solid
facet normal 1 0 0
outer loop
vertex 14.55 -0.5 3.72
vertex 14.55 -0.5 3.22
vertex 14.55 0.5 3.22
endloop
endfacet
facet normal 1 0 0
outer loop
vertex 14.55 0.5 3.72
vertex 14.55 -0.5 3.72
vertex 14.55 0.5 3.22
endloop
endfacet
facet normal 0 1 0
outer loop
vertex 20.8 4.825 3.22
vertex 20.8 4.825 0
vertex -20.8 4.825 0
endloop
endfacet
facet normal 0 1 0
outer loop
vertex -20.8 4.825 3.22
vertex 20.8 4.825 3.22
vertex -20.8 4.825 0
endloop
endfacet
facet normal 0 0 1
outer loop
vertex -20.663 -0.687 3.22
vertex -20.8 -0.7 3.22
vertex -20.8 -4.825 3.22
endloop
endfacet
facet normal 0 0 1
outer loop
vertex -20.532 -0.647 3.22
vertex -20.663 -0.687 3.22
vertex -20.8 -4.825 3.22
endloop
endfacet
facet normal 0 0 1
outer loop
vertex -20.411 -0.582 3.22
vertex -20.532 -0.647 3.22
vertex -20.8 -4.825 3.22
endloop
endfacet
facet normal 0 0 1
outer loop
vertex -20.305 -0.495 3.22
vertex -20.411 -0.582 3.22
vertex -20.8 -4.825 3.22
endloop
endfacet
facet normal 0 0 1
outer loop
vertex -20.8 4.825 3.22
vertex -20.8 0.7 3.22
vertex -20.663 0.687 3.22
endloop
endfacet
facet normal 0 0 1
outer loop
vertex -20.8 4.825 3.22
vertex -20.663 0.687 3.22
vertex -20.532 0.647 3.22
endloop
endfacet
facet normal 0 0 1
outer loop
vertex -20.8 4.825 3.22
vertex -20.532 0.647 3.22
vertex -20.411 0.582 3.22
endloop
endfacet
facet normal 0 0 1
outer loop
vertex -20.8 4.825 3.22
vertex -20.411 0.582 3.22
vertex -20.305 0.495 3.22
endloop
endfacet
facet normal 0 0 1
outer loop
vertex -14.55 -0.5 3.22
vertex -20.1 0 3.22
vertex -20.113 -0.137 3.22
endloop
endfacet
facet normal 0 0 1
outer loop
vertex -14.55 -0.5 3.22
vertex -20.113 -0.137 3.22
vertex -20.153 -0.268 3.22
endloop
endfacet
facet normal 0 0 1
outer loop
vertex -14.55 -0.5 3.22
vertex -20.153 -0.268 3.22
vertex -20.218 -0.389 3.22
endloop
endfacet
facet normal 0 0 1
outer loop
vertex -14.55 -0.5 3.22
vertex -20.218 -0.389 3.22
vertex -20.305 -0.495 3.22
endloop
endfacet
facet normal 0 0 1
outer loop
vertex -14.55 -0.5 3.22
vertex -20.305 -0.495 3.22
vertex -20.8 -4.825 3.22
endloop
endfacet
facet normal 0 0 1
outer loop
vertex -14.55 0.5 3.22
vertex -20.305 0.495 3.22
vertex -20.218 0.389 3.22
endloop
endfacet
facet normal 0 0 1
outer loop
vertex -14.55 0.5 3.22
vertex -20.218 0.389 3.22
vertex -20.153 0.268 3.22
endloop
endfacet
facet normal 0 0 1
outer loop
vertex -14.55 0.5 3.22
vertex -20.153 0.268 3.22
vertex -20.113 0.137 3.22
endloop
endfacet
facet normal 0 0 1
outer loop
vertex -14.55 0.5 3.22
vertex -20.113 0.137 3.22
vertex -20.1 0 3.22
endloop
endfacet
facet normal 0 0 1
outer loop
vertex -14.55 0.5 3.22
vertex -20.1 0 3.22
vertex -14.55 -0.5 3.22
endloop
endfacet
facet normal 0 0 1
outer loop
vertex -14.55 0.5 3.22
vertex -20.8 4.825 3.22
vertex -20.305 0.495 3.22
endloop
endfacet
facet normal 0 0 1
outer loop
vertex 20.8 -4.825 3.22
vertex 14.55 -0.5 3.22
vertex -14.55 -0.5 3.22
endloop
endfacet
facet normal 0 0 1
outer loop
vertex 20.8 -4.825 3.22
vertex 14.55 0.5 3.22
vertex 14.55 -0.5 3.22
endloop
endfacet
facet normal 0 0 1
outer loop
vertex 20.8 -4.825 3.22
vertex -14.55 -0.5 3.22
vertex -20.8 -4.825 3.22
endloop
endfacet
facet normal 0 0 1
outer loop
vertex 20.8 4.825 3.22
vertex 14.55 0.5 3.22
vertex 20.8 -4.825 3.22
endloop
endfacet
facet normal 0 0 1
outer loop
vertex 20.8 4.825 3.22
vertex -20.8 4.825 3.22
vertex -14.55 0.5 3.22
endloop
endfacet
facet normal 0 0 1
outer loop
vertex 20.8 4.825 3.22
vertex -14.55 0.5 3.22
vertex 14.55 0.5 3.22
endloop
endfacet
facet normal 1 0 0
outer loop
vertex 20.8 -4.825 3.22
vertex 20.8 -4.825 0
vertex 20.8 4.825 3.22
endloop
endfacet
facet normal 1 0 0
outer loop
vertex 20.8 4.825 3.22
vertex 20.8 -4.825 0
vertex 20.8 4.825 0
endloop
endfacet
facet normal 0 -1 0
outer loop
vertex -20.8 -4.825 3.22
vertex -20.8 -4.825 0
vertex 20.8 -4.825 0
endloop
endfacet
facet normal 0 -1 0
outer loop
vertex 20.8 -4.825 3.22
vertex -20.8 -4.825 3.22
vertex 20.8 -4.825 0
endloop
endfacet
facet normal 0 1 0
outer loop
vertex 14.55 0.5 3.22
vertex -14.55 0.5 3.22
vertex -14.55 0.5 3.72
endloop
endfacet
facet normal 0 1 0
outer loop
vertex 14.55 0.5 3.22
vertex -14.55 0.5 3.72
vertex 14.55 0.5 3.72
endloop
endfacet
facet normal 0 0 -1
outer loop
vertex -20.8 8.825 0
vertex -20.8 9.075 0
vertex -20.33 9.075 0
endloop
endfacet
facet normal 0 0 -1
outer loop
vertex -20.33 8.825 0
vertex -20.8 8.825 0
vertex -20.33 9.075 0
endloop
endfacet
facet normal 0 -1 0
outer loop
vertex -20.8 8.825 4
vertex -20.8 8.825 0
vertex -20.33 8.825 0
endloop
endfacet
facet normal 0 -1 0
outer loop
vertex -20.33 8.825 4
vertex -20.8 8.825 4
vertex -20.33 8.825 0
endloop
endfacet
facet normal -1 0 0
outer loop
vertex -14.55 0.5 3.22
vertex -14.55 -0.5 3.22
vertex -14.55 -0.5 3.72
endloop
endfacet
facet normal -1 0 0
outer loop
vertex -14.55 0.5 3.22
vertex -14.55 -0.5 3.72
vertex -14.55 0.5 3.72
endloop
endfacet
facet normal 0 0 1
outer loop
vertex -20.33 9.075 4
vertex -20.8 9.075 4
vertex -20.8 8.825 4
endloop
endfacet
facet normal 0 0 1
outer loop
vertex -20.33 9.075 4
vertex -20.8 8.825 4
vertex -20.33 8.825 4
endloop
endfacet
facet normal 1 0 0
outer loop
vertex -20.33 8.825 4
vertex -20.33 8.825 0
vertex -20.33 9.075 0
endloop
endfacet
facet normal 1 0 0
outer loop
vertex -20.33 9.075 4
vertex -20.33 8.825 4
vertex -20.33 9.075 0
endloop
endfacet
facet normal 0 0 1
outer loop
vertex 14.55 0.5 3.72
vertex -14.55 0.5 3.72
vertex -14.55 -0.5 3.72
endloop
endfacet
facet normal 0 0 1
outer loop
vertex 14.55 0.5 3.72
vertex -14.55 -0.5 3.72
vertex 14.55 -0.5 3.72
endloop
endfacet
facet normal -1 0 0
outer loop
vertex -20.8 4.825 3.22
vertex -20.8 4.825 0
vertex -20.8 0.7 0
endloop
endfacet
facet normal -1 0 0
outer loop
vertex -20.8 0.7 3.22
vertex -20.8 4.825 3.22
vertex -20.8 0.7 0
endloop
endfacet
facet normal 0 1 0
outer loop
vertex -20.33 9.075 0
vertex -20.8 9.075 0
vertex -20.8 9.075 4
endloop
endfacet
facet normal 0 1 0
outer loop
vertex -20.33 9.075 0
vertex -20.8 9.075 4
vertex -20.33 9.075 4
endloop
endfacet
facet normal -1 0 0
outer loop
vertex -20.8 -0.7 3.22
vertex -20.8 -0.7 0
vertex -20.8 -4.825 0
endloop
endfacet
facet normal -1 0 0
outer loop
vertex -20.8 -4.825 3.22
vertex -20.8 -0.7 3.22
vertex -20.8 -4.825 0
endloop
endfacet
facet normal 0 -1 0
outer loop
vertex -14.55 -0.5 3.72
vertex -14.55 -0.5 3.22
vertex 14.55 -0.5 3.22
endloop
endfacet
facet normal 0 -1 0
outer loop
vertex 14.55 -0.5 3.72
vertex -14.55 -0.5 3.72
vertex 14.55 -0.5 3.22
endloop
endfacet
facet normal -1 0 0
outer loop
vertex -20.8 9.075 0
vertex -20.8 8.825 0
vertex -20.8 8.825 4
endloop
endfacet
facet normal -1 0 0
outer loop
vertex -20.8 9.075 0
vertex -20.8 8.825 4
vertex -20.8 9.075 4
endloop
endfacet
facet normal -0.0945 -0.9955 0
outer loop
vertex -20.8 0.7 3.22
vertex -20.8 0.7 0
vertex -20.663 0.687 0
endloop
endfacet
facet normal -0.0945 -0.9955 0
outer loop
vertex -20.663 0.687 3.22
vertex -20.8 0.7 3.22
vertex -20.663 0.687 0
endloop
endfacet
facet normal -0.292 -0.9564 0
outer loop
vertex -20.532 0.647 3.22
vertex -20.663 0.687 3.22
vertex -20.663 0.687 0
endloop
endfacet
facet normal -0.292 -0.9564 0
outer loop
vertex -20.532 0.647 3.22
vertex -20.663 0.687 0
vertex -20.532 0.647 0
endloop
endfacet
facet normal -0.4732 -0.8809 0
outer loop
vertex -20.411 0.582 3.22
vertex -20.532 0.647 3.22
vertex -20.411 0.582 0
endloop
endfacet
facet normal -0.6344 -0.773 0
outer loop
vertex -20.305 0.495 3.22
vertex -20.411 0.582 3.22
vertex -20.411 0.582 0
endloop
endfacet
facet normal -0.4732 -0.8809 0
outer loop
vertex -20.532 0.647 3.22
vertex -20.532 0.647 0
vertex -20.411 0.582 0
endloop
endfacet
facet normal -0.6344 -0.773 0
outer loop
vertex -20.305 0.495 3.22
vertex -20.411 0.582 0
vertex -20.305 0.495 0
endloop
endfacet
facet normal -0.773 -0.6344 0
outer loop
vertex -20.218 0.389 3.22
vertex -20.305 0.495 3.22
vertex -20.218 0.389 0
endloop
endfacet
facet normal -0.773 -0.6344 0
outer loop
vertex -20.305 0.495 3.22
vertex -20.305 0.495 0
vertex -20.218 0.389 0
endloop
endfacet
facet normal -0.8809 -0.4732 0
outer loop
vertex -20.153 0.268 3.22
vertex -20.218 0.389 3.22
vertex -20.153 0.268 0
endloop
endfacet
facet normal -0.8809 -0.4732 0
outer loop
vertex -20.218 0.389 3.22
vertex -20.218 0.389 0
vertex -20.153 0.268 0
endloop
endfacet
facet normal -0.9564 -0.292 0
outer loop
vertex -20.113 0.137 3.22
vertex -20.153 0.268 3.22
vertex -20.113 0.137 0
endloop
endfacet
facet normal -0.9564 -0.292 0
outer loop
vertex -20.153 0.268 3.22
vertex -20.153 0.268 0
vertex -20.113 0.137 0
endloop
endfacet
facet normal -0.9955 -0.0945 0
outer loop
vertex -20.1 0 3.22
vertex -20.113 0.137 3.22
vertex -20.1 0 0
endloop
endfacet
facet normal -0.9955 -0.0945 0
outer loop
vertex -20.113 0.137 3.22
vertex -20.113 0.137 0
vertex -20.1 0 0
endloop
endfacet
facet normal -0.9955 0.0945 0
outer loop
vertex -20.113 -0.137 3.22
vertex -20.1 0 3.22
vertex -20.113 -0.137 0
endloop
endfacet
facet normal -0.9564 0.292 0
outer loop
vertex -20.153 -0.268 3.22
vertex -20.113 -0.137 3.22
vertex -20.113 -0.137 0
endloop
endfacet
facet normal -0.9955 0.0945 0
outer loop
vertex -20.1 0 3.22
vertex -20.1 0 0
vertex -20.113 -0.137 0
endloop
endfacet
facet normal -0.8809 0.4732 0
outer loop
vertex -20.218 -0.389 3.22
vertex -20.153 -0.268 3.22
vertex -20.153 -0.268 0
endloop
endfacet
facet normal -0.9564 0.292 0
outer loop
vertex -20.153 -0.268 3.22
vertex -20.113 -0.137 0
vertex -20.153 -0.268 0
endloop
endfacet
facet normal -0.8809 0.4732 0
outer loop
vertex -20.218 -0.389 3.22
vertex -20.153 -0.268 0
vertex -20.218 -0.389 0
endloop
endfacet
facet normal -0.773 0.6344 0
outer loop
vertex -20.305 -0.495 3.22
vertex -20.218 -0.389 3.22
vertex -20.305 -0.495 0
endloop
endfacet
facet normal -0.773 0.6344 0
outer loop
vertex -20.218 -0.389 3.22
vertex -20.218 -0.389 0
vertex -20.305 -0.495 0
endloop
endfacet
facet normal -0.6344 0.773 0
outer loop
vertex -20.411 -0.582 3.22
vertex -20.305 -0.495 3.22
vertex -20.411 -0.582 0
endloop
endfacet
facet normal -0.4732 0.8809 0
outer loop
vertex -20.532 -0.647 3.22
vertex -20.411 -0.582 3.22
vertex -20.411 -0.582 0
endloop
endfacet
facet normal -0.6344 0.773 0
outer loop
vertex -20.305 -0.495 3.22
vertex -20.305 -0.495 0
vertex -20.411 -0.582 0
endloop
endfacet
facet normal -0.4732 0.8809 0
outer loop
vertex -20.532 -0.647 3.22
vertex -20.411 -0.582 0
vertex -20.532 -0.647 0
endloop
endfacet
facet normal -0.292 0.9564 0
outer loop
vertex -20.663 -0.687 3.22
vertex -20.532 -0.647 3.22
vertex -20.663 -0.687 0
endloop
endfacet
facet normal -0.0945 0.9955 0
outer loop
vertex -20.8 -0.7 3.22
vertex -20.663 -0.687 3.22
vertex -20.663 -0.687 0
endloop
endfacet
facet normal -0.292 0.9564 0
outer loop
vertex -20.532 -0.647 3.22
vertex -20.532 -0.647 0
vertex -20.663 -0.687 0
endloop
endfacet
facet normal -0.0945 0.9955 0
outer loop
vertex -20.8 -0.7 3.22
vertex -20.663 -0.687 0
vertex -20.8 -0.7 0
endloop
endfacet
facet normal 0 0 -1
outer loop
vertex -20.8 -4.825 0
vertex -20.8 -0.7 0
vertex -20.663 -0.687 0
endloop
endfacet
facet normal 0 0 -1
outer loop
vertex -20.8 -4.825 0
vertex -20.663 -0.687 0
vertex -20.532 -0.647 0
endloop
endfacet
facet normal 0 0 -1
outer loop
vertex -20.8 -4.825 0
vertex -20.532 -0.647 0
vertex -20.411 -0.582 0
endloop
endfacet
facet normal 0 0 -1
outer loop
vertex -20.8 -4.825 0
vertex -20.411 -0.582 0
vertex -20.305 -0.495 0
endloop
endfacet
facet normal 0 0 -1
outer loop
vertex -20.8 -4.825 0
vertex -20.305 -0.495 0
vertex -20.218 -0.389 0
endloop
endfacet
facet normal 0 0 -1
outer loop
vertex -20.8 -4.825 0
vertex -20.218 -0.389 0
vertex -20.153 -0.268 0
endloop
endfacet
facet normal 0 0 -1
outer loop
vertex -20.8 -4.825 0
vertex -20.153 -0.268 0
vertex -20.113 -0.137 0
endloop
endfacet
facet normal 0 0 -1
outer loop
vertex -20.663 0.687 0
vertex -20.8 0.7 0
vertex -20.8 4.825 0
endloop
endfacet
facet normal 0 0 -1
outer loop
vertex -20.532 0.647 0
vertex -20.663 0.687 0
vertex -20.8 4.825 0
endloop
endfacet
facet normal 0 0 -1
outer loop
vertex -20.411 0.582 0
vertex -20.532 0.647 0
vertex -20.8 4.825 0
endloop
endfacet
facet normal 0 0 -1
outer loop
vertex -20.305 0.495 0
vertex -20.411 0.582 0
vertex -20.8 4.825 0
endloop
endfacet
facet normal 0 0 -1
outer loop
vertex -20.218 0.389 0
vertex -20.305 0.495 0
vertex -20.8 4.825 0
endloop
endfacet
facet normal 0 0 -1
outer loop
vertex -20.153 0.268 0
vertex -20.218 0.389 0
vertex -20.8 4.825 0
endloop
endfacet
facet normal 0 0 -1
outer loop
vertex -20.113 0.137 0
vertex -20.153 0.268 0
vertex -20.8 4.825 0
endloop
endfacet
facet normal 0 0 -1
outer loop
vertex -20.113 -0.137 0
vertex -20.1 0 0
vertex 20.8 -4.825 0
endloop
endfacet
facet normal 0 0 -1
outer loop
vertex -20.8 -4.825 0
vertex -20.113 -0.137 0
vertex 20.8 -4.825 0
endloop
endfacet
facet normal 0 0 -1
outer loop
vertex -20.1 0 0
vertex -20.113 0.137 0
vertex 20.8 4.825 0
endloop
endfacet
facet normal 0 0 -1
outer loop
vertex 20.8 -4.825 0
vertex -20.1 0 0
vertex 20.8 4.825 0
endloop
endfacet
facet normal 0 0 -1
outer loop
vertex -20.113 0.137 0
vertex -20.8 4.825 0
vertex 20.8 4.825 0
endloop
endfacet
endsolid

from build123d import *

# Parameters (mm, degrees)
F1_DEPTH = 3.22
F2_W     = 0.47
F2_H     = 0.25
F3_DEPTH = 4
F4_W     = 29.1
F4_H     = 1
F5_DEPTH = 0.5


with BuildPart() as f1:
    # F0 (on Top) → F1 (new body)
    with BuildSketch(Plane.XY):
        with BuildLine():
            Line((20.8, 4.825), (-20.8, 4.825))
            Line((-20.8, 4.825), (-20.8, 0.7))
            ThreePointArc((-20.8, 0.7), (-20.1, 0), (-20.8, -0.7))
            Line((-20.8, -0.7), (-20.8, -4.825))
            Line((-20.8, -4.825), (20.8, -4.825))
            Line((20.8, -4.825), (20.8, 4.825))
        make_face()
    extrude(amount=F1_DEPTH)

    # F4 (on face) → F5 (join)
    with BuildSketch(Plane.XY.offset(3.22)):
        Rectangle(F4_W, F4_H)
    extrude(amount=F5_DEPTH)


with BuildPart() as f3:
    # F2 (on Top) → F3 (new body)
    with BuildSketch(Plane.XY):
        with Locations((-20.565, 8.95)):
            Rectangle(F2_W, F2_H)
    extrude(amount=F3_DEPTH)


solid = Compound([f1.part, f3.part])
